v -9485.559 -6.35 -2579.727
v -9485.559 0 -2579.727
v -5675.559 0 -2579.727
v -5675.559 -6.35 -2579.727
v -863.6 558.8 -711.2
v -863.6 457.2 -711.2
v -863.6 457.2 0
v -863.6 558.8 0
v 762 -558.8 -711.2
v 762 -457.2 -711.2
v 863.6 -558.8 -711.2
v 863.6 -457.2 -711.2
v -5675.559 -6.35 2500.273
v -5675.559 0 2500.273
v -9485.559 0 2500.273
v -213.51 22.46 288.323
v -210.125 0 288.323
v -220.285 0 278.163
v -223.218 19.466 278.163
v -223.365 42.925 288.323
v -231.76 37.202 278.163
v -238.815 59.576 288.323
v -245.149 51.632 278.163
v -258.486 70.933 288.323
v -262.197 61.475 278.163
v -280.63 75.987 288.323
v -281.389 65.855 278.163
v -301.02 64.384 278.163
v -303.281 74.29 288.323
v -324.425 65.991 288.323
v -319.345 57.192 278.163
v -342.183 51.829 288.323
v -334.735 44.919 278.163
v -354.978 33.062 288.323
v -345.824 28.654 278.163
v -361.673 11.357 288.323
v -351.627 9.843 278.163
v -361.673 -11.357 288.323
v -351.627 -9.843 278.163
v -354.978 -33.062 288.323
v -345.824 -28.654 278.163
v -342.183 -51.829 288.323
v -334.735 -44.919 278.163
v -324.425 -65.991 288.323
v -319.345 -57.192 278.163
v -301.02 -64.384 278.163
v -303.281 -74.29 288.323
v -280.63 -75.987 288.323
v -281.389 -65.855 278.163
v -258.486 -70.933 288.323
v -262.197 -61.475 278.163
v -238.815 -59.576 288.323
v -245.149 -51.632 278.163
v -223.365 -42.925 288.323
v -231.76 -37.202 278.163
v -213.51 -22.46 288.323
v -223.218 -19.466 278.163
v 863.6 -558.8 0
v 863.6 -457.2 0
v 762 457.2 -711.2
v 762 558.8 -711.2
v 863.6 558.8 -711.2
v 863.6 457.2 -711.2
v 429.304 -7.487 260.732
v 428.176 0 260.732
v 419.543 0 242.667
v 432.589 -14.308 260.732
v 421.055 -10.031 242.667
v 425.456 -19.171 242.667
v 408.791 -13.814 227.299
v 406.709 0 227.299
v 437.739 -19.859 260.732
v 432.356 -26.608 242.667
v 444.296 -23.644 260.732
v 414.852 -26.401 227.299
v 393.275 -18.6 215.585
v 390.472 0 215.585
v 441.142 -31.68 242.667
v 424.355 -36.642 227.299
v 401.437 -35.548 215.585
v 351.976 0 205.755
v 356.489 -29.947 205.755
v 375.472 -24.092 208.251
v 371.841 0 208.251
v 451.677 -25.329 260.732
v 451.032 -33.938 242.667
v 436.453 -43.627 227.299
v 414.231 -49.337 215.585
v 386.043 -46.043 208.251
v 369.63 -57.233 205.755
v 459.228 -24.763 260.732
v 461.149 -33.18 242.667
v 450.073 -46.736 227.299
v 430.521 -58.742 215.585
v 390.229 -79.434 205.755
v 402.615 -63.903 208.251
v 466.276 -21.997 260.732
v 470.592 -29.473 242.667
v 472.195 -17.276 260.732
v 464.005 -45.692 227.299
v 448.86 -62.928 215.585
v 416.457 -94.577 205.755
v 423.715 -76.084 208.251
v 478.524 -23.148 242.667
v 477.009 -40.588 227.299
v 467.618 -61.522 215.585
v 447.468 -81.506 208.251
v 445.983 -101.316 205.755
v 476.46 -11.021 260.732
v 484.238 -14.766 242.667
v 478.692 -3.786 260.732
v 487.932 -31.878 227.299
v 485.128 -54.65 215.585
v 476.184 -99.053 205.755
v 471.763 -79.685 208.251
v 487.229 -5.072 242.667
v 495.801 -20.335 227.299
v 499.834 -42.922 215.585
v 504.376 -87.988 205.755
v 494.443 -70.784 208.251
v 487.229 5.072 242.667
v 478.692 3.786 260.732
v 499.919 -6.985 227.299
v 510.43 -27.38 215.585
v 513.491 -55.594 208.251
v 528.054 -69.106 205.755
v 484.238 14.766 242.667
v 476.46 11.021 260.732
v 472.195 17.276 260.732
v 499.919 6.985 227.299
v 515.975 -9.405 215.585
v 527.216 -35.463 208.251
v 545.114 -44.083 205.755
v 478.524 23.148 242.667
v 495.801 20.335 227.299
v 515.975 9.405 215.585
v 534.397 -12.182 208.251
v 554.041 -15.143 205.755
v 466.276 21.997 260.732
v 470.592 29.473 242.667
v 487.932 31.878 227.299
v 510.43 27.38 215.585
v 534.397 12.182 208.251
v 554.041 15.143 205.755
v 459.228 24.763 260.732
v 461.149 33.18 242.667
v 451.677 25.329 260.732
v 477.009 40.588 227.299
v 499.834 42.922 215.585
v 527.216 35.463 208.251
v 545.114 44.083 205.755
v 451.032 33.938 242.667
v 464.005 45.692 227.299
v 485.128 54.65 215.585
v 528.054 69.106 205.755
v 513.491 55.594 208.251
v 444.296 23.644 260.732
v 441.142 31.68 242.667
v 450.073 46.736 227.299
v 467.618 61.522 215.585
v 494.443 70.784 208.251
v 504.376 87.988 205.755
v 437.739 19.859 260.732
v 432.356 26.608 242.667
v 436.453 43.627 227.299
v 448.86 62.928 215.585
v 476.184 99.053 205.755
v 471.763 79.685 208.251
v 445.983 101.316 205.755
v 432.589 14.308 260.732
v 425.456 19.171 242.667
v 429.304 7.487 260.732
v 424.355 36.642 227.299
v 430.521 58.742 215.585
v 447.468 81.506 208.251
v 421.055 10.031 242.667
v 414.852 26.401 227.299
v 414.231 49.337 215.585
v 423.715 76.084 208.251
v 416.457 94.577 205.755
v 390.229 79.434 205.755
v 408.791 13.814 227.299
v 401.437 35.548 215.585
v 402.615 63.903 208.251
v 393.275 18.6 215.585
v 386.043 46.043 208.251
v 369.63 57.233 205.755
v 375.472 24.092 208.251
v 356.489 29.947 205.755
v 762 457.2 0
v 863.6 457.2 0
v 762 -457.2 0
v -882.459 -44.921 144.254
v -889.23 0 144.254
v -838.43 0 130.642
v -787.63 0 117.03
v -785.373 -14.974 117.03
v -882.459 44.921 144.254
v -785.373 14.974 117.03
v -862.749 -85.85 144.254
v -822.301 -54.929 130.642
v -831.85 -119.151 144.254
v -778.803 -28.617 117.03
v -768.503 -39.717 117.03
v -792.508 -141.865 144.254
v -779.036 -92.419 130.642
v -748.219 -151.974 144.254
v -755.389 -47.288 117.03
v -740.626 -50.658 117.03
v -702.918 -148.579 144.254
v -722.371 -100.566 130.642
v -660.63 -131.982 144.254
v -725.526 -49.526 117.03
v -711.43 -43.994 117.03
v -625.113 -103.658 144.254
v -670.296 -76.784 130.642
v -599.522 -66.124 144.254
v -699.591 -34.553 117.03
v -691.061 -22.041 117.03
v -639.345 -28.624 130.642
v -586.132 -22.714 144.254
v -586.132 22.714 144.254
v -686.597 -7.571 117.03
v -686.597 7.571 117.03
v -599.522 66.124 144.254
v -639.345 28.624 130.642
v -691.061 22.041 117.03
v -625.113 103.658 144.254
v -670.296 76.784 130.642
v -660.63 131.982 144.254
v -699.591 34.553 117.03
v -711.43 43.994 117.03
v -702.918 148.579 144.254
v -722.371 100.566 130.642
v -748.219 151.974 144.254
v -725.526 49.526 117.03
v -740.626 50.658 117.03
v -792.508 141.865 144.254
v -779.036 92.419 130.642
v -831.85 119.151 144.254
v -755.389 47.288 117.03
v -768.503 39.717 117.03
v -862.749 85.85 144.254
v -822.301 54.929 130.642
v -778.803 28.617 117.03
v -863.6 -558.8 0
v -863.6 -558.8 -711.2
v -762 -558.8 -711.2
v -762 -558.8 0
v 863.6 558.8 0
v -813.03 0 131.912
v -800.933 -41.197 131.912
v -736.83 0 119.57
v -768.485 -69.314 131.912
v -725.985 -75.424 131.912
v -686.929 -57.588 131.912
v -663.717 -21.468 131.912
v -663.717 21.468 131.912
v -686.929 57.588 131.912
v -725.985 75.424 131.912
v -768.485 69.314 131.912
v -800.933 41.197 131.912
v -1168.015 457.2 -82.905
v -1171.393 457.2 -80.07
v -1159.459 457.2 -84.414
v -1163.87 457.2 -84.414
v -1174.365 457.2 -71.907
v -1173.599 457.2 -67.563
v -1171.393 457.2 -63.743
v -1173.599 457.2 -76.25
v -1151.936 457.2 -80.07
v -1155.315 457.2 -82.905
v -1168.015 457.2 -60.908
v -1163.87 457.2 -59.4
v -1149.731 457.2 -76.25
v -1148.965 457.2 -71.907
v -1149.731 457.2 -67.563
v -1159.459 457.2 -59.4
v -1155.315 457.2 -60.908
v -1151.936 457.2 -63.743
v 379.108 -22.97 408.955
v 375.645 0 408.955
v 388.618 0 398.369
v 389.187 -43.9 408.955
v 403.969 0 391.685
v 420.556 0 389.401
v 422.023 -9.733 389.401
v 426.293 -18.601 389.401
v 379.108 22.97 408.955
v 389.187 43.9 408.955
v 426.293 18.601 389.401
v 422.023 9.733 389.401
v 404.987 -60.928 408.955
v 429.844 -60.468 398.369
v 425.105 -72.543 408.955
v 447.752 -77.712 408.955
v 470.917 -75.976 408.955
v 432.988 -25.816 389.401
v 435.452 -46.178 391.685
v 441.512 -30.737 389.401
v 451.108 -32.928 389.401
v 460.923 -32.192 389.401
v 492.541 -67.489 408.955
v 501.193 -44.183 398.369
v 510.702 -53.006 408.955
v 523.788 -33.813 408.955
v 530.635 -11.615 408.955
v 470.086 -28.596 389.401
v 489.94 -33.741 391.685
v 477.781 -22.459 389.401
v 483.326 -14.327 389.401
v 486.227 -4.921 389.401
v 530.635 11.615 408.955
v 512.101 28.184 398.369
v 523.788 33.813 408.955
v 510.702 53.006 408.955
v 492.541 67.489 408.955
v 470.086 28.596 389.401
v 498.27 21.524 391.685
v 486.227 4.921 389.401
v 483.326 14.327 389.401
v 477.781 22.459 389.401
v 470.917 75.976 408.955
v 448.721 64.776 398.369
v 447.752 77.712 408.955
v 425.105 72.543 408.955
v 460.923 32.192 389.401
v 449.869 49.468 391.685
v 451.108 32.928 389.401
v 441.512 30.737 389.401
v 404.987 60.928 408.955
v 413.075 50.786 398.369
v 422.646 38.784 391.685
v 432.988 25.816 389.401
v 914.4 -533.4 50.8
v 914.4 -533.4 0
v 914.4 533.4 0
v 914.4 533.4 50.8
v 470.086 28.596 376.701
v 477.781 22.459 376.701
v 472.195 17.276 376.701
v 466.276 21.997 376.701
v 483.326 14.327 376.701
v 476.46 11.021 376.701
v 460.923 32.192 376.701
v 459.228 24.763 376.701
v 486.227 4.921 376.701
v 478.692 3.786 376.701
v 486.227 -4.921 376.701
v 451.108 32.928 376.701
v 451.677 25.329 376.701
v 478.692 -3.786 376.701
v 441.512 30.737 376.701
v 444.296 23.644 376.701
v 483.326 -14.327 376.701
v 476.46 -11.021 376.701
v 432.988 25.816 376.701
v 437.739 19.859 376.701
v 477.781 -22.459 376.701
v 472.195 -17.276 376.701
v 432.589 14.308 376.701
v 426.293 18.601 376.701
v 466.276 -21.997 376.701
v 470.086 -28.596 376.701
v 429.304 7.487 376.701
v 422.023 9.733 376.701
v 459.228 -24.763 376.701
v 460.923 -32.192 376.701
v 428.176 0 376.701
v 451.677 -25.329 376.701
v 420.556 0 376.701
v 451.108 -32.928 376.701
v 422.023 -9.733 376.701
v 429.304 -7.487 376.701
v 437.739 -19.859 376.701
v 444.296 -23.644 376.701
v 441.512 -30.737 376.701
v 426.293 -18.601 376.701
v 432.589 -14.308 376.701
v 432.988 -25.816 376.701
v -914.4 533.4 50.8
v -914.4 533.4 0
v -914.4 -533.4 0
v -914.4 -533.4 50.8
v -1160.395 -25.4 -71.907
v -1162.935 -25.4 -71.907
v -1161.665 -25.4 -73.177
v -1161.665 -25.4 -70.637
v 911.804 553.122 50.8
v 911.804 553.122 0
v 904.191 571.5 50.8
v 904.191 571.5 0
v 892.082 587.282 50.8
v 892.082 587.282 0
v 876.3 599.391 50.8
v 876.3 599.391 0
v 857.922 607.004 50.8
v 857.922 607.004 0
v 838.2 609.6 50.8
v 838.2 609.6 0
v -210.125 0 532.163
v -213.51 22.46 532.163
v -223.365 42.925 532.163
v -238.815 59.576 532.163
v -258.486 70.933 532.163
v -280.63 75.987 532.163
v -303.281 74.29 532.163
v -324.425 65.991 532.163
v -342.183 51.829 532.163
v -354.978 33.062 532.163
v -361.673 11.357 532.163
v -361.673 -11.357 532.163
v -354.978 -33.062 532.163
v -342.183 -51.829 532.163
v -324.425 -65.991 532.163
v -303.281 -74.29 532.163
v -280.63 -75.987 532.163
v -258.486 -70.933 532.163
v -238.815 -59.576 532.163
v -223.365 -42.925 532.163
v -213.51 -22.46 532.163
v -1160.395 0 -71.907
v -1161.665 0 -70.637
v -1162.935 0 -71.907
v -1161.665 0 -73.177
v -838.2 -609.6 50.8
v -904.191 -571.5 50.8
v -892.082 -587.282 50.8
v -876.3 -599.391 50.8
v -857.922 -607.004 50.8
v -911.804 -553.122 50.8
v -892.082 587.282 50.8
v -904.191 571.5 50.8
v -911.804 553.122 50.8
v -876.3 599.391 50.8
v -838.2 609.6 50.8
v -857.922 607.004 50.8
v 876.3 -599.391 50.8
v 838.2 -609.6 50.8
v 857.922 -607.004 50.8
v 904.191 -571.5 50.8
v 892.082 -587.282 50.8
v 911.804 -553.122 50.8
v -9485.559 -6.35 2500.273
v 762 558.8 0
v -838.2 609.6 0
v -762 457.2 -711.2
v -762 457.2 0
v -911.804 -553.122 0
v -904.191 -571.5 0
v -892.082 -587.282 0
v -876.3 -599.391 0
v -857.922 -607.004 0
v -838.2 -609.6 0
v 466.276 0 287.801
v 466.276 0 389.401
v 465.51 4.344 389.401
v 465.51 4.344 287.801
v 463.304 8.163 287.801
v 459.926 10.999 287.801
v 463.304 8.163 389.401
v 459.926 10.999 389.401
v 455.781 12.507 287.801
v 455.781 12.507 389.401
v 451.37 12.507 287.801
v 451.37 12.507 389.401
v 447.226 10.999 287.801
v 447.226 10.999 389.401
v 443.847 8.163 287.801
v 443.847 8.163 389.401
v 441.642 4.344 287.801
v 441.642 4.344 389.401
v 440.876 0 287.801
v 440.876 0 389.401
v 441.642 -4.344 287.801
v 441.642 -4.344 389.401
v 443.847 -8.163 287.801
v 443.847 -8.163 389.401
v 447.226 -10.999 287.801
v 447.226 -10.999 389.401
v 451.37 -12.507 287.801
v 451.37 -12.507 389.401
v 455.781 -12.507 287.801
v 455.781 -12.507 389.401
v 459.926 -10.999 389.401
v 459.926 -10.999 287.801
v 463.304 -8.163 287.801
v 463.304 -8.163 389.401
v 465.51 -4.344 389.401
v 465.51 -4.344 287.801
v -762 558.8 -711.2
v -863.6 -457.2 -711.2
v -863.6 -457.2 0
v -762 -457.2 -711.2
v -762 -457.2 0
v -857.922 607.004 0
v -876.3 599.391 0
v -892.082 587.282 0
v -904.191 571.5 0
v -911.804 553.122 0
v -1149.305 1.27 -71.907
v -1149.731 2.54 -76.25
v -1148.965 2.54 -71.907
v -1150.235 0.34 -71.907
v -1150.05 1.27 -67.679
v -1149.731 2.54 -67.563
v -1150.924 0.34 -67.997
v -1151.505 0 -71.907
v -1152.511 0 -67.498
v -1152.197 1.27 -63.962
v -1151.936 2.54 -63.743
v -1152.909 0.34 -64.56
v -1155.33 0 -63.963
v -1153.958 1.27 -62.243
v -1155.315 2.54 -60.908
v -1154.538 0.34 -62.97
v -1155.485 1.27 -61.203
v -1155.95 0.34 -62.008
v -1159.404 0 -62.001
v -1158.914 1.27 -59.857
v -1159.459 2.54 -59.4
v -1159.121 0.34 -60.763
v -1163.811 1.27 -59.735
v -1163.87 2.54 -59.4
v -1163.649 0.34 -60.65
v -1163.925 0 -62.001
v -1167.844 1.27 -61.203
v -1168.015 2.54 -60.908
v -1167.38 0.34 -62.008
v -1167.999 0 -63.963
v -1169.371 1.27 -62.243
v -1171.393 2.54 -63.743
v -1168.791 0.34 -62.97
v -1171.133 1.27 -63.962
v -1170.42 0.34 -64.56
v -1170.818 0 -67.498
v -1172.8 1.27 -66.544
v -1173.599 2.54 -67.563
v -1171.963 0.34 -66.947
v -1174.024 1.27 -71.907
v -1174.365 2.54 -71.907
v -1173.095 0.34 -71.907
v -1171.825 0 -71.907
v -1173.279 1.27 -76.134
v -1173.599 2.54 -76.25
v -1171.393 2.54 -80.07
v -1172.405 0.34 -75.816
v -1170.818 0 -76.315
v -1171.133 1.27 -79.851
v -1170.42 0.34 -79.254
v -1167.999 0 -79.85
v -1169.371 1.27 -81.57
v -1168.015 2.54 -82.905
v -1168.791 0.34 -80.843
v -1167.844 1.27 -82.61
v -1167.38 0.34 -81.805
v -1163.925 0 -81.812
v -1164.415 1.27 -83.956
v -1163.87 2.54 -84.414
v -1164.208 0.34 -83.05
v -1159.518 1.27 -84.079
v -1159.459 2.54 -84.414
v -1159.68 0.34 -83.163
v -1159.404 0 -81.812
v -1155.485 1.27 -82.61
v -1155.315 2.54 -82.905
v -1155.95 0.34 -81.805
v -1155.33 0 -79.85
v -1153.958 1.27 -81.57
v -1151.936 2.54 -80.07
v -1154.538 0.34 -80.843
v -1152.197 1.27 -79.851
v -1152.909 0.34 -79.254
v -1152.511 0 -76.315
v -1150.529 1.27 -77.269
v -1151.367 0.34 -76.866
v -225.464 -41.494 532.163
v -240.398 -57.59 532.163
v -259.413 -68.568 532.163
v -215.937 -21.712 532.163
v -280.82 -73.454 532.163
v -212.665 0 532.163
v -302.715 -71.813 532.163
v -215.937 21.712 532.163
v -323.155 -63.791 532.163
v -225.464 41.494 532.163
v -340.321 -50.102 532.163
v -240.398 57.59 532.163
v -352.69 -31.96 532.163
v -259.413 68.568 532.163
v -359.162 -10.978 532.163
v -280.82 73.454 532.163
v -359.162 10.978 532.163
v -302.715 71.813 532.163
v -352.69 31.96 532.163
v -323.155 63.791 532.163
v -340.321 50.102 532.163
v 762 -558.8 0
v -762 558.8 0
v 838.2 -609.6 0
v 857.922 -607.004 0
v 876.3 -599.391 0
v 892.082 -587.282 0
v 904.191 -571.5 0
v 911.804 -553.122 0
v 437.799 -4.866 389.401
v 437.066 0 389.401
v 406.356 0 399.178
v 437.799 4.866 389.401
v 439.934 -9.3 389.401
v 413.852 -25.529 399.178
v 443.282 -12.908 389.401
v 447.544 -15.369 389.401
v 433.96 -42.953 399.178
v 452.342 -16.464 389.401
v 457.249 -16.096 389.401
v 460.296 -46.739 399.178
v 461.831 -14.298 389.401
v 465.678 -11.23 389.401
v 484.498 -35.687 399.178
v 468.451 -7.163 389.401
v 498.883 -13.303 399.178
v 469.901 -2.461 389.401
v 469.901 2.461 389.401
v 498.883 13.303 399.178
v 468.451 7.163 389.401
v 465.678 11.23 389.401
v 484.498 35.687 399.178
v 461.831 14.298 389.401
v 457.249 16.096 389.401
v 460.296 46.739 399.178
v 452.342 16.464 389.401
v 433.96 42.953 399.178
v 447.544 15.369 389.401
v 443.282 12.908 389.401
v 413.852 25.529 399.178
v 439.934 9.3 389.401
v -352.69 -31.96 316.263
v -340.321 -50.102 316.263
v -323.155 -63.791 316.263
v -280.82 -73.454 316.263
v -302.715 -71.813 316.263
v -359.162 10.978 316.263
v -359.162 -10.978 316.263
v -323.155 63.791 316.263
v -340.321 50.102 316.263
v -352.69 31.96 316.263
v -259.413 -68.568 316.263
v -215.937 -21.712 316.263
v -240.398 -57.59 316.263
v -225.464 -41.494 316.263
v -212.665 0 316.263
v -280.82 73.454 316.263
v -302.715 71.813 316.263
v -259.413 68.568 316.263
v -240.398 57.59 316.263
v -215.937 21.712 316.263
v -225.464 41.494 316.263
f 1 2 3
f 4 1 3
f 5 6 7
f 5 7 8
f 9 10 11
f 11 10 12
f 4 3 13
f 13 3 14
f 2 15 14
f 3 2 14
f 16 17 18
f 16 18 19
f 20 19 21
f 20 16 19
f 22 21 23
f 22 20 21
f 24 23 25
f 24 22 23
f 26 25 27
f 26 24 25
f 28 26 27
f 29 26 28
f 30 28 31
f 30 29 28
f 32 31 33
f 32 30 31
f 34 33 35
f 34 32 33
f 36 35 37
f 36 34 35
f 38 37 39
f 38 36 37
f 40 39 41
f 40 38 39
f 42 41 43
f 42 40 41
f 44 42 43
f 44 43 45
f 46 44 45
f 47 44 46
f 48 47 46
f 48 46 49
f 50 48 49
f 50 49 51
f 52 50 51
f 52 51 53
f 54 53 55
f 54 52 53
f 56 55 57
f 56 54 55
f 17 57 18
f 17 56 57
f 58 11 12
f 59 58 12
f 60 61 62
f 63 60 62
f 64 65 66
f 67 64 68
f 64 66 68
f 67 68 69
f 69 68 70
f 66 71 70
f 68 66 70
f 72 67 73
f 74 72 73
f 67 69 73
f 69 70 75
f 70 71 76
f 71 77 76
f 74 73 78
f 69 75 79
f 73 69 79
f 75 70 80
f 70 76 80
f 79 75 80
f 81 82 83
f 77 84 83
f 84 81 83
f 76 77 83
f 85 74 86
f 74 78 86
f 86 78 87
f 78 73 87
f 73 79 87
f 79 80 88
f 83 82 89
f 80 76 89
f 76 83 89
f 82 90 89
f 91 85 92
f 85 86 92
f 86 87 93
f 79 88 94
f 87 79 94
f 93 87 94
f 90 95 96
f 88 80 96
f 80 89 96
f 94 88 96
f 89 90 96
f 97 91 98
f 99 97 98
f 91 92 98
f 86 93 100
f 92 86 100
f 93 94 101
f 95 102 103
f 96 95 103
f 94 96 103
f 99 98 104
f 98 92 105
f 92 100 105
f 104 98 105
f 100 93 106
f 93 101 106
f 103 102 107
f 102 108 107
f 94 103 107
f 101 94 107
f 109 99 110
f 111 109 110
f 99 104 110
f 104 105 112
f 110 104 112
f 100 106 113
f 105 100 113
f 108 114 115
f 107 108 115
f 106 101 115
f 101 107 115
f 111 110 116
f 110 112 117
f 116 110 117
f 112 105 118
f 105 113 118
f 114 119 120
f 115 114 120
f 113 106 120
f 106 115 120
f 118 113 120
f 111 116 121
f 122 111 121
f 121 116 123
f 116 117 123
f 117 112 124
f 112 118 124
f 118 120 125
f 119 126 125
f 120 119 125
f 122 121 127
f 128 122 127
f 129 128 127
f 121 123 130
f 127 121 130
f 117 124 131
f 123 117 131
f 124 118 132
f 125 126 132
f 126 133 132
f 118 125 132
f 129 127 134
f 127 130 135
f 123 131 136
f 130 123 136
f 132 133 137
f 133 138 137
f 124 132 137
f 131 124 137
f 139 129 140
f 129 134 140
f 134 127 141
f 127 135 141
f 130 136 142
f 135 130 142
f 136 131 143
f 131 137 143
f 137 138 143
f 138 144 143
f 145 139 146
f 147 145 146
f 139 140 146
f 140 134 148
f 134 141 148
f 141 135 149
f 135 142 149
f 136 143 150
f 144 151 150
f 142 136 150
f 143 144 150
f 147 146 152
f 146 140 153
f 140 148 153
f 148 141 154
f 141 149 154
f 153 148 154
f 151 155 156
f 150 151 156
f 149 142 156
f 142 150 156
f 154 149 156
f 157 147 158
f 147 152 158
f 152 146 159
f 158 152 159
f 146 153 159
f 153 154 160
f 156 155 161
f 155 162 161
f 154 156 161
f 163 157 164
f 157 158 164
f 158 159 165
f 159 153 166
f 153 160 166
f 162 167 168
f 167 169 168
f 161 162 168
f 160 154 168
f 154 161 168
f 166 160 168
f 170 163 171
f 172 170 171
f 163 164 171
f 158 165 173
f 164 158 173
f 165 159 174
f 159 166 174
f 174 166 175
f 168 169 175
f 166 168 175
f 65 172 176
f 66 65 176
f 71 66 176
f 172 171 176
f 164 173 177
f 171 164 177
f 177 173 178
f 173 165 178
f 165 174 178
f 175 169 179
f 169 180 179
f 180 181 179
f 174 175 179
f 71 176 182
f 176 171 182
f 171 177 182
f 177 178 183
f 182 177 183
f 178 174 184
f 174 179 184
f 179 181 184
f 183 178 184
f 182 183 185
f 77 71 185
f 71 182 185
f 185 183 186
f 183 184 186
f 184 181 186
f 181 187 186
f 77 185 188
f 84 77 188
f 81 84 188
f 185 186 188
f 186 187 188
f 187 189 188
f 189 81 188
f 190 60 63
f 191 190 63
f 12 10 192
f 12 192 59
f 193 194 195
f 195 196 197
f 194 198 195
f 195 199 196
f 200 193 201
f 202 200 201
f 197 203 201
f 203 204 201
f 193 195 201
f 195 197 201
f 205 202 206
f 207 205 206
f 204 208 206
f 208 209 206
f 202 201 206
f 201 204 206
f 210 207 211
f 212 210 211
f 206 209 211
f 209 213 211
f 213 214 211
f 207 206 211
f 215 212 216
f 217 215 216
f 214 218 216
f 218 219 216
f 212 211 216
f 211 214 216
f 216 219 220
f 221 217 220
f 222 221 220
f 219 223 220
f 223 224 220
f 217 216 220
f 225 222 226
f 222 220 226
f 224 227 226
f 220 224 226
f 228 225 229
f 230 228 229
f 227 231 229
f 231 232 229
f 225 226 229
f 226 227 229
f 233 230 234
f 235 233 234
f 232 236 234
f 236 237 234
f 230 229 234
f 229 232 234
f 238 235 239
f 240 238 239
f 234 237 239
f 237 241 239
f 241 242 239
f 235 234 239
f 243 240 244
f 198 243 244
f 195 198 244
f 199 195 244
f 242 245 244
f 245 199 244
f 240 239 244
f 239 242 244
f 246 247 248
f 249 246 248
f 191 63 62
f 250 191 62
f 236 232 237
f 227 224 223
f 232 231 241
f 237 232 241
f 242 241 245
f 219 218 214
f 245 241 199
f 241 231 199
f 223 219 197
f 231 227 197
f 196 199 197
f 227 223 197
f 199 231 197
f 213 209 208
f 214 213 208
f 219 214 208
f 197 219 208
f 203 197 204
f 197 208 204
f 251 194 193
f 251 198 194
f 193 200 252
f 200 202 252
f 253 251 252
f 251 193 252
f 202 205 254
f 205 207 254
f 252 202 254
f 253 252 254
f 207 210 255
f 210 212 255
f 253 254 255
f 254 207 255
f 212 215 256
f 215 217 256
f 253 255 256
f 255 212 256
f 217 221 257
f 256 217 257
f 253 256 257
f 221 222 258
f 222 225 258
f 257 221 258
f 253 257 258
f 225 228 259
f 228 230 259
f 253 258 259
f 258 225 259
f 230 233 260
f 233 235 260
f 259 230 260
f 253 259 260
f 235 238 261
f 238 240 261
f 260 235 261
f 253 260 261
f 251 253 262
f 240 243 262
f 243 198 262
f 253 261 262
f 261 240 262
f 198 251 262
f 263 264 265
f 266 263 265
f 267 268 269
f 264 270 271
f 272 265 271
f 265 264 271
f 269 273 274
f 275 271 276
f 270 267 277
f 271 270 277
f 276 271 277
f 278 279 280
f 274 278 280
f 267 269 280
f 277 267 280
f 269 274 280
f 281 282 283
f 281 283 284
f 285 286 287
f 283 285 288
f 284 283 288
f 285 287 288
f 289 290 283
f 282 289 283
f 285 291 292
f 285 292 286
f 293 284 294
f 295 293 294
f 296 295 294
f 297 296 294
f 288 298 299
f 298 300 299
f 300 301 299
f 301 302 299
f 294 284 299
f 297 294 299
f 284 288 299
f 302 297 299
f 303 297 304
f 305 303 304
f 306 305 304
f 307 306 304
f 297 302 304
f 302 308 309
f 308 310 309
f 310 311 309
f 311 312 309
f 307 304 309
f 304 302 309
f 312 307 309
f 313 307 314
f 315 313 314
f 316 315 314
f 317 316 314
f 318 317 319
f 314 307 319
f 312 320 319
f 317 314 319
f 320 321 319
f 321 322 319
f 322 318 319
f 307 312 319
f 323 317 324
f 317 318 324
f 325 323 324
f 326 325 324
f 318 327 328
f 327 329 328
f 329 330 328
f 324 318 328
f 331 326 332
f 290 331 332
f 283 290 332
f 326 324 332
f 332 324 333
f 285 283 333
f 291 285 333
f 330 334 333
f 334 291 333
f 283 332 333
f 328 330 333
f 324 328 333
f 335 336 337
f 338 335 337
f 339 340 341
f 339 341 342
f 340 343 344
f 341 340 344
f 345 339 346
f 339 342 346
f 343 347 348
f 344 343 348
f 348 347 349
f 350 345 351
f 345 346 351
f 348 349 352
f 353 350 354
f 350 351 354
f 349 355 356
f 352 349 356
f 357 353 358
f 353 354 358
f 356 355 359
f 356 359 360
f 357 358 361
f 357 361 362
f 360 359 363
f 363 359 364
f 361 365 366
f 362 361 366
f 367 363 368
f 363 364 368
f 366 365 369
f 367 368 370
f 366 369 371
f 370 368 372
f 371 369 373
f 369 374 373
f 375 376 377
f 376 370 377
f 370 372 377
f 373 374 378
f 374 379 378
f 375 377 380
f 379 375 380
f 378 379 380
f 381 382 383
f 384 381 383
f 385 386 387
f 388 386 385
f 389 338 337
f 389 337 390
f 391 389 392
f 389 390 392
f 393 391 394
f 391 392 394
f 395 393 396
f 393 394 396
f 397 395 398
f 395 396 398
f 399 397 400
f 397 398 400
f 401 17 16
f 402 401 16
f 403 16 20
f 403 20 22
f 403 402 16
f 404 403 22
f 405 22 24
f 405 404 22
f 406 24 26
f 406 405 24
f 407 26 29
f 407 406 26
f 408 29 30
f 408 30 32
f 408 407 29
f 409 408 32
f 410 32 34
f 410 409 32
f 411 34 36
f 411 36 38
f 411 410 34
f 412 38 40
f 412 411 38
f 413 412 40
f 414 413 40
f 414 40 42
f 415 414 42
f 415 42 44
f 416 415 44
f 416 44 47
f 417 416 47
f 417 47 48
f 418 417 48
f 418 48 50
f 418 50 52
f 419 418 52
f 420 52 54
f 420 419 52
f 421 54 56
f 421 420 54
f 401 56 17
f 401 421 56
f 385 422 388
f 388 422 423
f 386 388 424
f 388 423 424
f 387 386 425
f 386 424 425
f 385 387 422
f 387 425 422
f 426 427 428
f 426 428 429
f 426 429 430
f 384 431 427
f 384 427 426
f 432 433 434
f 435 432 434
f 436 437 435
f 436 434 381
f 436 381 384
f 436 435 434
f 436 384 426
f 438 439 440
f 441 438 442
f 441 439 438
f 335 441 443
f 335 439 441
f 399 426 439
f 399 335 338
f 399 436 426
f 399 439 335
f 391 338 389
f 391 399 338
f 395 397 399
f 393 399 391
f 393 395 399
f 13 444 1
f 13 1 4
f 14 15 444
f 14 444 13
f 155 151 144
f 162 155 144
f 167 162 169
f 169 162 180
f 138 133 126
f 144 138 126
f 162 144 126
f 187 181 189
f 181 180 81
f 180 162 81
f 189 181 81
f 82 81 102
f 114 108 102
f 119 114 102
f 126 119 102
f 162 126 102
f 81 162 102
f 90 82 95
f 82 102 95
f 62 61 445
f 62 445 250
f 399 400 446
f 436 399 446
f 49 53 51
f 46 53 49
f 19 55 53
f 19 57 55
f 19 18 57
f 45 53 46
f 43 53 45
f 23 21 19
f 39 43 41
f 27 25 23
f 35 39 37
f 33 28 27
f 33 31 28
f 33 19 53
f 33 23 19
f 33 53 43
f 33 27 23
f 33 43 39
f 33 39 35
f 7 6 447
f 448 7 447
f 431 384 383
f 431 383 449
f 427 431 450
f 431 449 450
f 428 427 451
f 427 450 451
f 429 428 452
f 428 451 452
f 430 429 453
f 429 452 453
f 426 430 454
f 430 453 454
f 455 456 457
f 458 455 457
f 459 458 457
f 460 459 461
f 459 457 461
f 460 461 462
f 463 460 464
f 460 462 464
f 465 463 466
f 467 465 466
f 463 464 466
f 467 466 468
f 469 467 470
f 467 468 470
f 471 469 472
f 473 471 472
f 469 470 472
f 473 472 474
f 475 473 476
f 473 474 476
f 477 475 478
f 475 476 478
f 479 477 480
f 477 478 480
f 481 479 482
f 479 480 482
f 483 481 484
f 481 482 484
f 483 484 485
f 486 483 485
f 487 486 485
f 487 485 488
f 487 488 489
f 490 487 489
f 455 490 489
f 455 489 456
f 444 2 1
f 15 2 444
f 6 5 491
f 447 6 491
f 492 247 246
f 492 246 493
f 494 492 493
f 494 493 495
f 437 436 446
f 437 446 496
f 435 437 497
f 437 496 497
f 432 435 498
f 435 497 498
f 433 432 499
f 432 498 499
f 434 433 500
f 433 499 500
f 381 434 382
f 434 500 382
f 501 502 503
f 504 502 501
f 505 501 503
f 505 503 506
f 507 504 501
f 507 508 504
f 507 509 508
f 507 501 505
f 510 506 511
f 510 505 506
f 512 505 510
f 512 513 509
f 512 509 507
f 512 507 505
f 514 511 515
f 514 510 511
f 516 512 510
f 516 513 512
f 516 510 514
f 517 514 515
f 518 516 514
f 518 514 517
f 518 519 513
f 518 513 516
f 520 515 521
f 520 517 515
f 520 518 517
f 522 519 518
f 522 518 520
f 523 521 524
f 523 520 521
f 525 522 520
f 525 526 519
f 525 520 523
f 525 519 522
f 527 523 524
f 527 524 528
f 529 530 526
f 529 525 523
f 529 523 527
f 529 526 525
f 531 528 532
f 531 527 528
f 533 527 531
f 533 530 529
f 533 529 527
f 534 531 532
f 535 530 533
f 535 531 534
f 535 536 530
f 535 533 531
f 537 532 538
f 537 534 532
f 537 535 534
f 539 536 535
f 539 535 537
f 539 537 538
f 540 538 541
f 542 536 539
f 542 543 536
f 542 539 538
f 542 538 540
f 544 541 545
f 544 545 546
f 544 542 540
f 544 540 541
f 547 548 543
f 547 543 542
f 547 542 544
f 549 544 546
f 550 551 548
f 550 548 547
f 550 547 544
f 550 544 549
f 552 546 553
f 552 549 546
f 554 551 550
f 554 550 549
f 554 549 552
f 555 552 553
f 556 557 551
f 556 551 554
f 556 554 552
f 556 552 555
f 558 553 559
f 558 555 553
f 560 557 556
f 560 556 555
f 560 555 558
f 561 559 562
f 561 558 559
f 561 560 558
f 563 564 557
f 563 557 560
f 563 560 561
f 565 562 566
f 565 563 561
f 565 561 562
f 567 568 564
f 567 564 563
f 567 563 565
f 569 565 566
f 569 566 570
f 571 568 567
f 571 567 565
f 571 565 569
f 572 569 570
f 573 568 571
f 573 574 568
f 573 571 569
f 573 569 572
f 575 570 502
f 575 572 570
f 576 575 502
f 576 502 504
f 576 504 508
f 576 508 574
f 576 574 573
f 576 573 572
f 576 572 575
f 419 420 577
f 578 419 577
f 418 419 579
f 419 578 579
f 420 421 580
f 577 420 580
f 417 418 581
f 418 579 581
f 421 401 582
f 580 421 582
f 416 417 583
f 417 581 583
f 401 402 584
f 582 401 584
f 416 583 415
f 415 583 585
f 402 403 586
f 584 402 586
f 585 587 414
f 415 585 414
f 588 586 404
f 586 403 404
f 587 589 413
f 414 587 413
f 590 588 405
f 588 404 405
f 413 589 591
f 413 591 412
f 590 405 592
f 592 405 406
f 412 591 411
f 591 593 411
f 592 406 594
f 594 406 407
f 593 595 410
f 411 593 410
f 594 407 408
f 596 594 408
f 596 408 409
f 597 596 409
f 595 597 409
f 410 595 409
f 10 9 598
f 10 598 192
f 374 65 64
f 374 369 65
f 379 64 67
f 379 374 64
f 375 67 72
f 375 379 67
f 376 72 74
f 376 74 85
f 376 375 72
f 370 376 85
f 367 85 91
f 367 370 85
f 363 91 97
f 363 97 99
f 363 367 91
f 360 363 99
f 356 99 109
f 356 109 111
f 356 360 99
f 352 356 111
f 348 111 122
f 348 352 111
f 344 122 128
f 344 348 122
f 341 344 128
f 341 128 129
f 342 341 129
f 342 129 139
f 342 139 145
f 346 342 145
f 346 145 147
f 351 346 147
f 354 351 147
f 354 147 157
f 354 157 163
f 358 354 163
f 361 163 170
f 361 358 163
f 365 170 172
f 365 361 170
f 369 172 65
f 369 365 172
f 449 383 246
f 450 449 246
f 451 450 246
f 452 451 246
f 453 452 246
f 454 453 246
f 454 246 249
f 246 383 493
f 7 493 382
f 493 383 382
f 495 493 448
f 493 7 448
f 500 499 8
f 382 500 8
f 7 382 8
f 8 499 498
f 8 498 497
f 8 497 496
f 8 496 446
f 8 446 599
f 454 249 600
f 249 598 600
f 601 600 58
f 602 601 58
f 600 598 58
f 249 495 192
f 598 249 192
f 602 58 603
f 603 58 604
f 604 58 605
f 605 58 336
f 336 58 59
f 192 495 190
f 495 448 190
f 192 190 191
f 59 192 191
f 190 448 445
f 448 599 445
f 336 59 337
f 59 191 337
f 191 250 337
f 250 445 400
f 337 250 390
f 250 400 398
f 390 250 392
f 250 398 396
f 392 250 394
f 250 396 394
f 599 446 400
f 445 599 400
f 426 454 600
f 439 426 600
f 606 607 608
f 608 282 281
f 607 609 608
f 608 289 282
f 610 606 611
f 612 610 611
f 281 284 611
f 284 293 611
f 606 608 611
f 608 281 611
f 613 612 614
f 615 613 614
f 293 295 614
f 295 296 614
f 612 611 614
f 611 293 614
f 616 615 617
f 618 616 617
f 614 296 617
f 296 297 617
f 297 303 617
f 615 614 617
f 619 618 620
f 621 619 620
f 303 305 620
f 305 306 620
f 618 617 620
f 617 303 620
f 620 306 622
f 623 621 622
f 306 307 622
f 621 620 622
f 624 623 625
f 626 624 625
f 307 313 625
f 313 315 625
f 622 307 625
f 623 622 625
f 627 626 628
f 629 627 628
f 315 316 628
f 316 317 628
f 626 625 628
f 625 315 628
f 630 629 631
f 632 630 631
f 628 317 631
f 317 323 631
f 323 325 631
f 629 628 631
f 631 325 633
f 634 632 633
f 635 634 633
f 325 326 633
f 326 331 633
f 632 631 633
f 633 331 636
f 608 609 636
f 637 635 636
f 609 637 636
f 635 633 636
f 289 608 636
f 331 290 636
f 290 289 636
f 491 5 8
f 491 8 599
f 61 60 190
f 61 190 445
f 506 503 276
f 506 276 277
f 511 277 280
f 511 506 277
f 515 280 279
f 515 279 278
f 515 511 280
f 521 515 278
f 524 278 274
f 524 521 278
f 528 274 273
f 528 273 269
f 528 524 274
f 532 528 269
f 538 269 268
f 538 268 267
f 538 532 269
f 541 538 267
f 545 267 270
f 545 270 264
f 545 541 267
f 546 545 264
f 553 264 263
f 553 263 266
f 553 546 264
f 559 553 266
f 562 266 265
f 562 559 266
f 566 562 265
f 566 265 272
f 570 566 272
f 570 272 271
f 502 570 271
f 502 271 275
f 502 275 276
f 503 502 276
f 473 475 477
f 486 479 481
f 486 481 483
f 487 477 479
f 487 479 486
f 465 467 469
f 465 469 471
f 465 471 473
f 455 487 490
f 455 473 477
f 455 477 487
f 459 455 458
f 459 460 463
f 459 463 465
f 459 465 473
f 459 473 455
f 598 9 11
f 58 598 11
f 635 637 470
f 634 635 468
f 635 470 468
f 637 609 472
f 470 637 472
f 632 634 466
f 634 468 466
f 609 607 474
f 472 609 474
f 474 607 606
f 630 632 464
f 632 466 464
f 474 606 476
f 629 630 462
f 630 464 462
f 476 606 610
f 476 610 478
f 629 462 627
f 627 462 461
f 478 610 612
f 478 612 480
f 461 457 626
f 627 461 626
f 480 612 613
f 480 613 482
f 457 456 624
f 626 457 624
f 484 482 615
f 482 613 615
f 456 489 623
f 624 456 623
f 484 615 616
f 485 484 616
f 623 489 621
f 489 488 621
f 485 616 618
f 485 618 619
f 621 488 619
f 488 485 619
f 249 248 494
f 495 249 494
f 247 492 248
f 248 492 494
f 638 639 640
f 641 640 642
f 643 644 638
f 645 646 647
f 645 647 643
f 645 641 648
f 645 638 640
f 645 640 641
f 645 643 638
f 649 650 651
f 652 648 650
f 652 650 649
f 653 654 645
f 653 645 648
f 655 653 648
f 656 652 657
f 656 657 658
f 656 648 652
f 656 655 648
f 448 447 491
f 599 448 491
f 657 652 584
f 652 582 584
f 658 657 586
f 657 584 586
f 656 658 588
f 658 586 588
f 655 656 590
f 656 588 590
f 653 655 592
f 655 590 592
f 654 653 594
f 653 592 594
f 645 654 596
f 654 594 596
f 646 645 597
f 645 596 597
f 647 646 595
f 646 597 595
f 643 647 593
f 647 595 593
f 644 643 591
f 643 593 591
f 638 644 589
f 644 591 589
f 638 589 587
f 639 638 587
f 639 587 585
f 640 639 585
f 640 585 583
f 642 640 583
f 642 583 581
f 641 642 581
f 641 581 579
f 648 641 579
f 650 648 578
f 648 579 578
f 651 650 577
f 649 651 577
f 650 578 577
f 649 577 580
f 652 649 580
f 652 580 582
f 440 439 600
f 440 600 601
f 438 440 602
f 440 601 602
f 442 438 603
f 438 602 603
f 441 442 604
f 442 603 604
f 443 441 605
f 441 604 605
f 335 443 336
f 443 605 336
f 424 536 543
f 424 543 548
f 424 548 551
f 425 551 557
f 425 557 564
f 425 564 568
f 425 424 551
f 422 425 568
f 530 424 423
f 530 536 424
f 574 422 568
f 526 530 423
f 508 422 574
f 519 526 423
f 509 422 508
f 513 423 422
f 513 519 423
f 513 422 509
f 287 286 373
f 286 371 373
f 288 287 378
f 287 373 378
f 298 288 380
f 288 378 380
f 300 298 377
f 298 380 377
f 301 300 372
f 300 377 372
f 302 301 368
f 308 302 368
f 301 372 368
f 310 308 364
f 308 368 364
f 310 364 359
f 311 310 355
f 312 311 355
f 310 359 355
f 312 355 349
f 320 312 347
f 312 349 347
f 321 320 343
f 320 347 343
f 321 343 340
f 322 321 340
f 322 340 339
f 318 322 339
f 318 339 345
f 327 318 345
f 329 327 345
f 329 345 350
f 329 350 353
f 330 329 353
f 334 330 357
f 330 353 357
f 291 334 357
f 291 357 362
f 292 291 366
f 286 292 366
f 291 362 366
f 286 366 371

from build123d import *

# Parameters (mm, degrees)
F0_W      = 101.6
F0_H      = 101.6
F1_DEPTH  = 50.8
F2_DEPTH  = 711.2
F3_W      = 2.54
F3_H      = 215.9
F5_SIZE   = 10.16
F8_R      = 12.7
F8_R_2    = 1.27
F9_DEPTH  = 457.2
F10_DEPTH = 25.4
F11_R     = 2.54
F12_W     = 25.4
F12_H     = 115.9687861614
F14_R     = 12.7
F15_DEPTH = 101.6
F16_W     = 3810
F16_H     = 5080
F17_DEPTH = 6.35


with BuildPart() as f1:
    # F0 (on Top) → F1 (new body)
    with BuildSketch(Plane.XY):
        with BuildLine():
            Line((838.2, 609.6), (-838.2, 609.6))
            ThreePointArc((-838.2, 609.6), (-892.0815367264, 587.2815367264), (-914.4, 533.4))
            Line((-914.4, 533.4), (-914.4, -533.4))
            ThreePointArc((-914.4, -533.4), (-892.0815367264, -587.2815367264), (-838.2, -609.6))
            Line((-838.2, -609.6), (838.2, -609.6))
            ThreePointArc((838.2, -609.6), (892.0815367264, -587.2815367264), (914.4, -533.4))
            Line((914.4, -533.4), (914.4, 533.4))
            ThreePointArc((914.4, 533.4), (892.0815367264, 587.2815367264), (838.2, 609.6))
        make_face()
        with Locations((-812.8, -508)):
            Rectangle(F0_W, F0_H, mode=Mode.SUBTRACT)
        with Locations((812.8, -508)):
            Rectangle(F0_W, F0_H, mode=Mode.SUBTRACT)
        with Locations((-812.8, 508)):
            Rectangle(F0_W, F0_H, mode=Mode.SUBTRACT)
        with Locations((812.8, 508)):
            Rectangle(F0_W, F0_H, mode=Mode.SUBTRACT)
        with Locations((-812.8, -508)):
            Rectangle(F0_W, F0_H)
        with Locations((812.8, -508)):
            Rectangle(F0_W, F0_H)
        with Locations((812.8, 508)):
            Rectangle(F0_W, F0_H)
        with Locations((-812.8, 508)):
            Rectangle(F0_W, F0_H)
    extrude(amount=F1_DEPTH)

    # F0 (on Top) → F2 (join)
    with BuildSketch(Plane.XY):
        with Locations((-812.8, -508)):
            Rectangle(F0_W, F0_H)
        with Locations((-812.8, 508)):
            Rectangle(F0_W, F0_H)
        with Locations((812.8, 508)):
            Rectangle(F0_W, F0_H)
        with Locations((812.8, -508)):
            Rectangle(F0_W, F0_H)
    extrude(amount=-F2_DEPTH)


with BuildPart() as f4:
    # F3 (on Front) → F4 (revolve)
    with BuildSketch(Plane.XZ):
        Polygon((-286.3245010376, 316.2632285118), (-286.3245010376, 278.1632285118), (-210.1245010376, 278.1632285118), (-210.1245010376, 316.2632285118), (-212.6645010376, 316.2632285118), align=None)
        with Locations((-211.3945010376, 424.2132285118)):
            Rectangle(F3_W, F3_H)
    revolve(axis=Axis((-286.3245010376, 0, 405.1632285118), (0, 0, 1)))

    # F5
    f5_edges = [f4.edges().sort_by_distance(p)[0] for p in [
        (-362.524501, 0, 278.163229),
    ]]
    chamfer(f5_edges, length=F5_SIZE)


with BuildPart() as f7:
    # F6 (on Front) → F7 (revolve)
    with BuildSketch(Plane.XZ):
        Polygon((-787.6298852921, 117.0304474873), (-736.8298852921, 117.0304474873), (-736.8298852921, 119.5704474873), (-889.2298852921, 144.2540854383), align=None)
    revolve(axis=Axis((-736.8298852921, 0, 187.9355122422), (0, 0, 1)))


with BuildPart() as f9:
    # F8 (on Front) → F9 (new body)
    with BuildSketch(Plane.XZ):
        with Locations((-1161.6646051407, -71.9066634774)):
            Circle(F8_R)
        with Locations((-1161.6646051407, -71.9066634774)):
            Circle(F8_R_2, mode=Mode.SUBTRACT)
        with Locations((-1161.6646051407, -71.9066634774)):
            Circle(F8_R_2)
    extrude(amount=-F9_DEPTH)

    # F8 (on Front) → F10 (join)
    with BuildSketch(Plane.XZ):
        with Locations((-1161.6646051407, -71.9066634774)):
            Circle(F8_R_2)
    extrude(amount=F10_DEPTH)

    # F11
    f11_edges = [f9.edges().sort_by_distance(p)[0] for p in [
        (-1174.364605, 0, -71.906663),
    ]]
    fillet(f11_edges, radius=F11_R)


with BuildPart() as f13:
    # F12 (on Front) → F13 (revolve)
    with BuildSketch(Plane.XZ):
        Polygon((428.1756336873, 376.7006152139), (453.5756336873, 376.7006152139), (453.5756336873, 389.4006152139), (437.0656336873, 389.4006152139), (420.5556336873, 389.4006152139), (420.5556336873, 376.7006152139), align=None)
        with Locations((440.8756336873, 318.7162221332)):
            Rectangle(F12_W, F12_H)
        with BuildLine():
            Line((351.9756336873, 205.7550829578), (453.5756336873, 205.7550829578))
            Line((453.5756336873, 205.7550829578), (453.5756336873, 260.7318290524))
            Line((453.5756336873, 260.7318290524), (428.1756336873, 260.7318290524))
            ThreePointArc((428.1756336873, 260.7318290524), (398.9567006482, 220.9339369722), (351.9756336873, 205.7550829578))
        make_face()
        with BuildLine():
            Line((420.5556336873, 389.4006152139), (437.0656336873, 389.4006152139))
            Line((437.0656336873, 389.4006152139), (375.645477209, 408.9550829578))
            ThreePointArc((375.645477209, 408.9550829578), (396.0643119403, 394.5012700165), (420.5556336873, 389.4006152139))
        make_face()
    revolve(axis=Axis((453.5756336873, 0, 307.3550829578), (0, 0, 1)))

    # F14 (on face) → F15 (cut)
    with BuildSketch(Plane.XY.offset(389.4006152139)):
        with Locations((453.5756336873, 0)):
            Circle(F14_R)
    extrude(amount=-F15_DEPTH, mode=Mode.SUBTRACT)


with BuildPart() as f17:
    # F16 (on Front) → F17 (new body)
    with BuildSketch(Plane.XZ):
        with Locations((-7580.5585479736, -39.7266790259)):
            Rectangle(F16_W, F16_H)
    extrude(amount=F17_DEPTH)


solid = Compound([f1.part, f4.part, f7.part, f9.part, f13.part, f17.part])
